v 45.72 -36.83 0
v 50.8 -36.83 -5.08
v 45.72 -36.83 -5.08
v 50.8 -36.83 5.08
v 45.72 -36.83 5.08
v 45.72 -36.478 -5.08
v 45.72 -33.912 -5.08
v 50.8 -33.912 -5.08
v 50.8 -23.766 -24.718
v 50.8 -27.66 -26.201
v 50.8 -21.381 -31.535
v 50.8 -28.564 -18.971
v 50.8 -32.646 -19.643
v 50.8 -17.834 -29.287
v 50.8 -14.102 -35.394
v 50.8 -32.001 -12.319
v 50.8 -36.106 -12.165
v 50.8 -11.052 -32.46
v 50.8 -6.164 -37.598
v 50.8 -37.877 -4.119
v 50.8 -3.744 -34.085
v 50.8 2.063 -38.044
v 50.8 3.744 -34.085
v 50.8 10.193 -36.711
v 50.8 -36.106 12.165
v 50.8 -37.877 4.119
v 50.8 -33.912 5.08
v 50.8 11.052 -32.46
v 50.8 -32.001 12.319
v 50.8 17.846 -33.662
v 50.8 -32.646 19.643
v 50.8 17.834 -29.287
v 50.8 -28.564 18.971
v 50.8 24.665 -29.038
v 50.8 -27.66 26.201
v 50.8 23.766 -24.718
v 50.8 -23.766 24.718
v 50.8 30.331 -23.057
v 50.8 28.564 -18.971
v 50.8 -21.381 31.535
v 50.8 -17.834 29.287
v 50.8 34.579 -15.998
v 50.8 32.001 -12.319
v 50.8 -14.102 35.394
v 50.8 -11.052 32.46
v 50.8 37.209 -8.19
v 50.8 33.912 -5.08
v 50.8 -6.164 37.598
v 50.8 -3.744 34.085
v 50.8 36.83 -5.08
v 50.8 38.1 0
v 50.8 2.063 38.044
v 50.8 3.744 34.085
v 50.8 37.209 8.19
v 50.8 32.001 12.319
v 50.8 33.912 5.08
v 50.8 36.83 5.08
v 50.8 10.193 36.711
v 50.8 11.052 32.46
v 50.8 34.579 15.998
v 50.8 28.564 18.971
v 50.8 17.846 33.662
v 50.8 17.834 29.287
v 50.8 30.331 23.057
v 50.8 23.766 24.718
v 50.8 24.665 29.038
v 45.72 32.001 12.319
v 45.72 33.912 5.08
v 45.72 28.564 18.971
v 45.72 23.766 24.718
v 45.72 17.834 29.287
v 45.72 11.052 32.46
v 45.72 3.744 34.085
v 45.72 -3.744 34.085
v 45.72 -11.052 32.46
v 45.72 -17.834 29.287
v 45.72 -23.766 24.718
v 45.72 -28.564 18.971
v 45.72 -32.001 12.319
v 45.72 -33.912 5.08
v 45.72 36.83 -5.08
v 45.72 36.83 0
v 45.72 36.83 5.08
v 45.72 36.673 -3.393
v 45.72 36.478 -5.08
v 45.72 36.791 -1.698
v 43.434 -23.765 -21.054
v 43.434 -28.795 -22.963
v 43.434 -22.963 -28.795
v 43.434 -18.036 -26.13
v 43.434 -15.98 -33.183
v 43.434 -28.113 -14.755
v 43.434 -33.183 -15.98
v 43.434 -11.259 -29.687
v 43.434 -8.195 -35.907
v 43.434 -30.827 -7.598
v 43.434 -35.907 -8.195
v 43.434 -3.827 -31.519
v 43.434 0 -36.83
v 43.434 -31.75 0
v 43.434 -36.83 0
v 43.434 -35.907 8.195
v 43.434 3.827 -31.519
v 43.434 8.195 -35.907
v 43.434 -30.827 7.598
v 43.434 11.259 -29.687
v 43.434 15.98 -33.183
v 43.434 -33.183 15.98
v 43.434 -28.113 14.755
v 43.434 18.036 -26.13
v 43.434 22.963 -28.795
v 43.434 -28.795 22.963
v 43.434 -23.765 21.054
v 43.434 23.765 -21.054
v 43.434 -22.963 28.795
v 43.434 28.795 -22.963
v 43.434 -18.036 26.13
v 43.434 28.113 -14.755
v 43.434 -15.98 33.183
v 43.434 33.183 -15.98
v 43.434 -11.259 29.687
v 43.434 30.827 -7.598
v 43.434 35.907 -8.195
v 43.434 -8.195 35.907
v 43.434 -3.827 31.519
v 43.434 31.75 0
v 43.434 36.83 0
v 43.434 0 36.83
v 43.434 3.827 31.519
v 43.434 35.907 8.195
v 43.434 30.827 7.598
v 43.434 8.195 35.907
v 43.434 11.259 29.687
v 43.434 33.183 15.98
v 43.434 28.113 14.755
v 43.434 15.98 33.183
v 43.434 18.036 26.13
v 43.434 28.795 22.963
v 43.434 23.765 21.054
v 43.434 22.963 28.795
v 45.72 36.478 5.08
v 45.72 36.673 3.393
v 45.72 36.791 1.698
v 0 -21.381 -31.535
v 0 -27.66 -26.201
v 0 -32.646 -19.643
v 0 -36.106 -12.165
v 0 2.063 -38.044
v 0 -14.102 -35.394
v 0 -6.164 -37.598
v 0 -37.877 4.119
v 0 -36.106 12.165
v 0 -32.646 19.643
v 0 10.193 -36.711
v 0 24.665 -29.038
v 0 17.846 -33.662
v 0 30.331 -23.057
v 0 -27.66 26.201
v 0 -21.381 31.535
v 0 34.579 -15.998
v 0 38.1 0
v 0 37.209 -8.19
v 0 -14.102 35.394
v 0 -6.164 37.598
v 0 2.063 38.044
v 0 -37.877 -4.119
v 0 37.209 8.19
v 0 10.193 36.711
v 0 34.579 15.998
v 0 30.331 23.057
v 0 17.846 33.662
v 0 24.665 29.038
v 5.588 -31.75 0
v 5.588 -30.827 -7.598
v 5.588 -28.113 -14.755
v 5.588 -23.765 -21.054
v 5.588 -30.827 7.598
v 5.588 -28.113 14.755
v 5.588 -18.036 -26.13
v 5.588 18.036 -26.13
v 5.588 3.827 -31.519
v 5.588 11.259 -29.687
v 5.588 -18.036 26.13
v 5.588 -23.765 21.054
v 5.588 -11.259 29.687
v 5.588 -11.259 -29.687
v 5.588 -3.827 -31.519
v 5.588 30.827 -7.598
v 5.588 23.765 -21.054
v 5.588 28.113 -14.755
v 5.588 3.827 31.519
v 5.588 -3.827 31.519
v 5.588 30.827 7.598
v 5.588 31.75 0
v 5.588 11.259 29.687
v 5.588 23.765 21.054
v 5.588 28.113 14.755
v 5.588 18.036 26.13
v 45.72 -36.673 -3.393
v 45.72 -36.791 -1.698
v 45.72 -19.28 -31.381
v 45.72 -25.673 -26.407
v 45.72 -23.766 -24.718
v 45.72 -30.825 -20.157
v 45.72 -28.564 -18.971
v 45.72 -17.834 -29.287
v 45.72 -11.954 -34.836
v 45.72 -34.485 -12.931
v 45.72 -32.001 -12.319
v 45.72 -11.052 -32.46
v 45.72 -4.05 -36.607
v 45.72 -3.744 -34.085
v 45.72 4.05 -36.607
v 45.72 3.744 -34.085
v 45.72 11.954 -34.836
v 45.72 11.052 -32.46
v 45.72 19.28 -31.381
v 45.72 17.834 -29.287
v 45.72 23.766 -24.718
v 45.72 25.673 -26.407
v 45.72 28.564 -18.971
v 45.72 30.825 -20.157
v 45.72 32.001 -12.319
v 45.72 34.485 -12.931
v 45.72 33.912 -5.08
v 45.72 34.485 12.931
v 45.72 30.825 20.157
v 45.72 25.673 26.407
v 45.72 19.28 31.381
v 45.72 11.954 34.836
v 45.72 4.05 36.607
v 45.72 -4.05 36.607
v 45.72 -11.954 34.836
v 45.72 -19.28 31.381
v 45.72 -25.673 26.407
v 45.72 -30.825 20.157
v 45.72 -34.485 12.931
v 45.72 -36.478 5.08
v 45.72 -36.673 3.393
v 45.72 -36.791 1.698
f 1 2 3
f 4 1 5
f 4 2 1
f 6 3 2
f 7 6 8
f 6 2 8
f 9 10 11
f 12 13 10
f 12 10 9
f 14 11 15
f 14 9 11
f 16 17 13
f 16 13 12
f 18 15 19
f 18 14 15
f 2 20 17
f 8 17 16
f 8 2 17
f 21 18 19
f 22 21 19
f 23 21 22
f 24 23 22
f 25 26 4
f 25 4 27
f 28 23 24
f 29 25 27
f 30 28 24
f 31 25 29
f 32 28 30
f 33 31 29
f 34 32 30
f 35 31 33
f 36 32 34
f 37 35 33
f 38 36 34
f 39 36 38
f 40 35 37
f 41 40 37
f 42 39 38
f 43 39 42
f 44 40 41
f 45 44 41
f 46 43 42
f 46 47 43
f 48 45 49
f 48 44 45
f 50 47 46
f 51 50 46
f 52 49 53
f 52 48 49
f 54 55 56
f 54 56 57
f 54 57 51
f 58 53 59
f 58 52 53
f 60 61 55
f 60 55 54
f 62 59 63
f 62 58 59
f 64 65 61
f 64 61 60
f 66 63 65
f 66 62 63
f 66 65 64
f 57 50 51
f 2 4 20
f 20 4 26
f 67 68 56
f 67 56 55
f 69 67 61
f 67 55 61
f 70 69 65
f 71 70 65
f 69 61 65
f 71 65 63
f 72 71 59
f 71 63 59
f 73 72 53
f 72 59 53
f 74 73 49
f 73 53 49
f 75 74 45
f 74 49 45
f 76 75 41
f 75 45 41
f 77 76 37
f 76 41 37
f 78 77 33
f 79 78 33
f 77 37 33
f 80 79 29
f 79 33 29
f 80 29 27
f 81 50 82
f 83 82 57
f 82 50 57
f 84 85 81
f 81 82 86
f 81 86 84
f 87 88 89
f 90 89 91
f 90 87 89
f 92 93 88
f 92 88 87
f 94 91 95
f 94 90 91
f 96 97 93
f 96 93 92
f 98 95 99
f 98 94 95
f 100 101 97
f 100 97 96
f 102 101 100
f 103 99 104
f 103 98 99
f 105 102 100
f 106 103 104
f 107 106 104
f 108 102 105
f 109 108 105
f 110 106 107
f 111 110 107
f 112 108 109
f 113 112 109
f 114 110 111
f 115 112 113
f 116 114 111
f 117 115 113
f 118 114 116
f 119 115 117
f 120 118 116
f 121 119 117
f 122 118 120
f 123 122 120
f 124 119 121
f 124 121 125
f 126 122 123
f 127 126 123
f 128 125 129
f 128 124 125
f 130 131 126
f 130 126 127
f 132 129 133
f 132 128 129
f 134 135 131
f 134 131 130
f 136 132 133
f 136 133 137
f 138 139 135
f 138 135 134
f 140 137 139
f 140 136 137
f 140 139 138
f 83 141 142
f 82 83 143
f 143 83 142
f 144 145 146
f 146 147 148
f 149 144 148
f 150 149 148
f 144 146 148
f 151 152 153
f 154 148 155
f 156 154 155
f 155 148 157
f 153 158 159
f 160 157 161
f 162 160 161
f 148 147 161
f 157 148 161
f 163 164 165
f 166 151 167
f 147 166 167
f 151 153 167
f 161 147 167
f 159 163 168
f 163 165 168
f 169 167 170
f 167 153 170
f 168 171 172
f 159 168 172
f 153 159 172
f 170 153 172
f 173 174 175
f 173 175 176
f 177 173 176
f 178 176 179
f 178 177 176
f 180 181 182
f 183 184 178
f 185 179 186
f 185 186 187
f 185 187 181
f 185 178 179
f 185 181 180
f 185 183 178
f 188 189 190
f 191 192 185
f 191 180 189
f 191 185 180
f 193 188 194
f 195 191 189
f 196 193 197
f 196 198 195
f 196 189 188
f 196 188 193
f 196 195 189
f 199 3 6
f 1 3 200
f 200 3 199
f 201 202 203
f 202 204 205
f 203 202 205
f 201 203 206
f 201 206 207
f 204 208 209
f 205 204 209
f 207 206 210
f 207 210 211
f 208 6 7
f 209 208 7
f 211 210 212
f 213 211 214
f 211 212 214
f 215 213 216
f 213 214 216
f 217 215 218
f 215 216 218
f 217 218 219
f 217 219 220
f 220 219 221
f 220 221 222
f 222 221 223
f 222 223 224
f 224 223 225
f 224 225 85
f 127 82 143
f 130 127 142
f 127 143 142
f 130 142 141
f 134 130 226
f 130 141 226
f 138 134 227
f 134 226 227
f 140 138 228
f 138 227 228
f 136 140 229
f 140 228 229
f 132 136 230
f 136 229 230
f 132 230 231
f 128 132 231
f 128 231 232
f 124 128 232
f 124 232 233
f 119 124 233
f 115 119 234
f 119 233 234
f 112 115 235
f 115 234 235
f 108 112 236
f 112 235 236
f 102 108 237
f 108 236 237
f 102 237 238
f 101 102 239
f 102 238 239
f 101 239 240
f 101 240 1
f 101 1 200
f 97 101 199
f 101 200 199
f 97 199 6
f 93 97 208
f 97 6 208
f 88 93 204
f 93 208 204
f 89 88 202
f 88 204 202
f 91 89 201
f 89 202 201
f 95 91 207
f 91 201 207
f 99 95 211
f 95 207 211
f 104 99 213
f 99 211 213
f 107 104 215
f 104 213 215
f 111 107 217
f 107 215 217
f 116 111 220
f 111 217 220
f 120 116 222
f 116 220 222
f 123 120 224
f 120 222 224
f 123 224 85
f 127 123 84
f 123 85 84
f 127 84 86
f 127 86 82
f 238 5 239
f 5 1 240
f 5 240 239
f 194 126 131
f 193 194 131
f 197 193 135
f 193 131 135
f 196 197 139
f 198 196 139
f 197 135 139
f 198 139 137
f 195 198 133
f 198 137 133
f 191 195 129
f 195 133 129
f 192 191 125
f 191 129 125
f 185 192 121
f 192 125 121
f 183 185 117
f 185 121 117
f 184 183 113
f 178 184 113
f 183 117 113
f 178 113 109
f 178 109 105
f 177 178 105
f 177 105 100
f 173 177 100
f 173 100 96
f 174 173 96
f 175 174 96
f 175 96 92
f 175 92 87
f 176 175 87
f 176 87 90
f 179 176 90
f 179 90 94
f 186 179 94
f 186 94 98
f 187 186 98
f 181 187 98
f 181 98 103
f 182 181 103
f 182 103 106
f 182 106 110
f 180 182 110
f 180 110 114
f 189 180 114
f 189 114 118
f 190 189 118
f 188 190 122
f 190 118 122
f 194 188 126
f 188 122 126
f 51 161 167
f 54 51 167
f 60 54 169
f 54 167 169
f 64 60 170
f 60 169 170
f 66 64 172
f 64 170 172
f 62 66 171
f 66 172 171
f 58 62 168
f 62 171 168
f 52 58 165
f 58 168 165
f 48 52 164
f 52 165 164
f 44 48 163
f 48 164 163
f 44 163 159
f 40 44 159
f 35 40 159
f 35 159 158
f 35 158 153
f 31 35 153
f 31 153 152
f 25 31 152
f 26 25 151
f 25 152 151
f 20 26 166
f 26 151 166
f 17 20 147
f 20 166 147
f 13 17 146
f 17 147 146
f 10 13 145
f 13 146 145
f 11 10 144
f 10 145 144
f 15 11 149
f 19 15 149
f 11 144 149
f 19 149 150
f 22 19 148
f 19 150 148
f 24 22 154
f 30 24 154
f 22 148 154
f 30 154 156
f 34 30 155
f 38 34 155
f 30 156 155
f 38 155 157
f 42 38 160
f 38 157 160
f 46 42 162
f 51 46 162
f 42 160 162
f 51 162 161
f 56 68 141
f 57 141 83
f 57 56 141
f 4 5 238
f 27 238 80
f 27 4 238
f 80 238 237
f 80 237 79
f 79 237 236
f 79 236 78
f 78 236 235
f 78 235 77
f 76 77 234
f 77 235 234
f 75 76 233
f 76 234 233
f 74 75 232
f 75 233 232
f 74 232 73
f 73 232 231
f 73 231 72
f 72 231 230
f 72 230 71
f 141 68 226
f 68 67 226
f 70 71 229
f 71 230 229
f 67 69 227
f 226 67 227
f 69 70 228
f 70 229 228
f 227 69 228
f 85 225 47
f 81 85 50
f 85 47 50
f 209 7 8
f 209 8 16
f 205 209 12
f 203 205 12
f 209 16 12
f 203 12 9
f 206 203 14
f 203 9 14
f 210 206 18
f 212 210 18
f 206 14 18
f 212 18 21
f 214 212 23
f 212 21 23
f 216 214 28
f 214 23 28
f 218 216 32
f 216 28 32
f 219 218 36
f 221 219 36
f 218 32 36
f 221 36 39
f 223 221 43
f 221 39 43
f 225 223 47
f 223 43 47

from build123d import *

# Parameters (mm, degrees)
F0_R     = 38.1
F1_DEPTH = 50.8
F2_R     = 31.75
F3_DEPTH = 45.212
F4_R     = 34.29
F5_DEPTH = 5.08
F6_W     = 73.66
F6_H     = 10.16
F7_DEPTH = 5.08
F8_R     = 36.83
F9_DEPTH = 2.286


with BuildPart() as f1:
    # F0 (on Right) → F1 (new body)
    with BuildSketch(Plane.YZ):
        Circle(F0_R)
    extrude(amount=F1_DEPTH)

    # F2 (on face) → F3 (cut)
    with BuildSketch(Plane.YZ.offset(50.8)):
        Circle(F2_R)
    extrude(amount=-F3_DEPTH, mode=Mode.SUBTRACT)

    # F4 (on face) → F5 (cut)
    with BuildSketch(Plane.YZ.offset(50.8)):
        Circle(F4_R)
    extrude(amount=-F5_DEPTH, mode=Mode.SUBTRACT)

    # F6 (on face) → F7 (cut)
    with BuildSketch(Plane.YZ.offset(50.8)):
        Rectangle(F6_W, F6_H)
    extrude(amount=-F7_DEPTH, mode=Mode.SUBTRACT)

    # F8 (on face) → F9 (cut)
    with BuildSketch(Plane.YZ.offset(45.72)):
        Circle(F8_R)
    extrude(amount=-F9_DEPTH, mode=Mode.SUBTRACT)


solid = f1.part
